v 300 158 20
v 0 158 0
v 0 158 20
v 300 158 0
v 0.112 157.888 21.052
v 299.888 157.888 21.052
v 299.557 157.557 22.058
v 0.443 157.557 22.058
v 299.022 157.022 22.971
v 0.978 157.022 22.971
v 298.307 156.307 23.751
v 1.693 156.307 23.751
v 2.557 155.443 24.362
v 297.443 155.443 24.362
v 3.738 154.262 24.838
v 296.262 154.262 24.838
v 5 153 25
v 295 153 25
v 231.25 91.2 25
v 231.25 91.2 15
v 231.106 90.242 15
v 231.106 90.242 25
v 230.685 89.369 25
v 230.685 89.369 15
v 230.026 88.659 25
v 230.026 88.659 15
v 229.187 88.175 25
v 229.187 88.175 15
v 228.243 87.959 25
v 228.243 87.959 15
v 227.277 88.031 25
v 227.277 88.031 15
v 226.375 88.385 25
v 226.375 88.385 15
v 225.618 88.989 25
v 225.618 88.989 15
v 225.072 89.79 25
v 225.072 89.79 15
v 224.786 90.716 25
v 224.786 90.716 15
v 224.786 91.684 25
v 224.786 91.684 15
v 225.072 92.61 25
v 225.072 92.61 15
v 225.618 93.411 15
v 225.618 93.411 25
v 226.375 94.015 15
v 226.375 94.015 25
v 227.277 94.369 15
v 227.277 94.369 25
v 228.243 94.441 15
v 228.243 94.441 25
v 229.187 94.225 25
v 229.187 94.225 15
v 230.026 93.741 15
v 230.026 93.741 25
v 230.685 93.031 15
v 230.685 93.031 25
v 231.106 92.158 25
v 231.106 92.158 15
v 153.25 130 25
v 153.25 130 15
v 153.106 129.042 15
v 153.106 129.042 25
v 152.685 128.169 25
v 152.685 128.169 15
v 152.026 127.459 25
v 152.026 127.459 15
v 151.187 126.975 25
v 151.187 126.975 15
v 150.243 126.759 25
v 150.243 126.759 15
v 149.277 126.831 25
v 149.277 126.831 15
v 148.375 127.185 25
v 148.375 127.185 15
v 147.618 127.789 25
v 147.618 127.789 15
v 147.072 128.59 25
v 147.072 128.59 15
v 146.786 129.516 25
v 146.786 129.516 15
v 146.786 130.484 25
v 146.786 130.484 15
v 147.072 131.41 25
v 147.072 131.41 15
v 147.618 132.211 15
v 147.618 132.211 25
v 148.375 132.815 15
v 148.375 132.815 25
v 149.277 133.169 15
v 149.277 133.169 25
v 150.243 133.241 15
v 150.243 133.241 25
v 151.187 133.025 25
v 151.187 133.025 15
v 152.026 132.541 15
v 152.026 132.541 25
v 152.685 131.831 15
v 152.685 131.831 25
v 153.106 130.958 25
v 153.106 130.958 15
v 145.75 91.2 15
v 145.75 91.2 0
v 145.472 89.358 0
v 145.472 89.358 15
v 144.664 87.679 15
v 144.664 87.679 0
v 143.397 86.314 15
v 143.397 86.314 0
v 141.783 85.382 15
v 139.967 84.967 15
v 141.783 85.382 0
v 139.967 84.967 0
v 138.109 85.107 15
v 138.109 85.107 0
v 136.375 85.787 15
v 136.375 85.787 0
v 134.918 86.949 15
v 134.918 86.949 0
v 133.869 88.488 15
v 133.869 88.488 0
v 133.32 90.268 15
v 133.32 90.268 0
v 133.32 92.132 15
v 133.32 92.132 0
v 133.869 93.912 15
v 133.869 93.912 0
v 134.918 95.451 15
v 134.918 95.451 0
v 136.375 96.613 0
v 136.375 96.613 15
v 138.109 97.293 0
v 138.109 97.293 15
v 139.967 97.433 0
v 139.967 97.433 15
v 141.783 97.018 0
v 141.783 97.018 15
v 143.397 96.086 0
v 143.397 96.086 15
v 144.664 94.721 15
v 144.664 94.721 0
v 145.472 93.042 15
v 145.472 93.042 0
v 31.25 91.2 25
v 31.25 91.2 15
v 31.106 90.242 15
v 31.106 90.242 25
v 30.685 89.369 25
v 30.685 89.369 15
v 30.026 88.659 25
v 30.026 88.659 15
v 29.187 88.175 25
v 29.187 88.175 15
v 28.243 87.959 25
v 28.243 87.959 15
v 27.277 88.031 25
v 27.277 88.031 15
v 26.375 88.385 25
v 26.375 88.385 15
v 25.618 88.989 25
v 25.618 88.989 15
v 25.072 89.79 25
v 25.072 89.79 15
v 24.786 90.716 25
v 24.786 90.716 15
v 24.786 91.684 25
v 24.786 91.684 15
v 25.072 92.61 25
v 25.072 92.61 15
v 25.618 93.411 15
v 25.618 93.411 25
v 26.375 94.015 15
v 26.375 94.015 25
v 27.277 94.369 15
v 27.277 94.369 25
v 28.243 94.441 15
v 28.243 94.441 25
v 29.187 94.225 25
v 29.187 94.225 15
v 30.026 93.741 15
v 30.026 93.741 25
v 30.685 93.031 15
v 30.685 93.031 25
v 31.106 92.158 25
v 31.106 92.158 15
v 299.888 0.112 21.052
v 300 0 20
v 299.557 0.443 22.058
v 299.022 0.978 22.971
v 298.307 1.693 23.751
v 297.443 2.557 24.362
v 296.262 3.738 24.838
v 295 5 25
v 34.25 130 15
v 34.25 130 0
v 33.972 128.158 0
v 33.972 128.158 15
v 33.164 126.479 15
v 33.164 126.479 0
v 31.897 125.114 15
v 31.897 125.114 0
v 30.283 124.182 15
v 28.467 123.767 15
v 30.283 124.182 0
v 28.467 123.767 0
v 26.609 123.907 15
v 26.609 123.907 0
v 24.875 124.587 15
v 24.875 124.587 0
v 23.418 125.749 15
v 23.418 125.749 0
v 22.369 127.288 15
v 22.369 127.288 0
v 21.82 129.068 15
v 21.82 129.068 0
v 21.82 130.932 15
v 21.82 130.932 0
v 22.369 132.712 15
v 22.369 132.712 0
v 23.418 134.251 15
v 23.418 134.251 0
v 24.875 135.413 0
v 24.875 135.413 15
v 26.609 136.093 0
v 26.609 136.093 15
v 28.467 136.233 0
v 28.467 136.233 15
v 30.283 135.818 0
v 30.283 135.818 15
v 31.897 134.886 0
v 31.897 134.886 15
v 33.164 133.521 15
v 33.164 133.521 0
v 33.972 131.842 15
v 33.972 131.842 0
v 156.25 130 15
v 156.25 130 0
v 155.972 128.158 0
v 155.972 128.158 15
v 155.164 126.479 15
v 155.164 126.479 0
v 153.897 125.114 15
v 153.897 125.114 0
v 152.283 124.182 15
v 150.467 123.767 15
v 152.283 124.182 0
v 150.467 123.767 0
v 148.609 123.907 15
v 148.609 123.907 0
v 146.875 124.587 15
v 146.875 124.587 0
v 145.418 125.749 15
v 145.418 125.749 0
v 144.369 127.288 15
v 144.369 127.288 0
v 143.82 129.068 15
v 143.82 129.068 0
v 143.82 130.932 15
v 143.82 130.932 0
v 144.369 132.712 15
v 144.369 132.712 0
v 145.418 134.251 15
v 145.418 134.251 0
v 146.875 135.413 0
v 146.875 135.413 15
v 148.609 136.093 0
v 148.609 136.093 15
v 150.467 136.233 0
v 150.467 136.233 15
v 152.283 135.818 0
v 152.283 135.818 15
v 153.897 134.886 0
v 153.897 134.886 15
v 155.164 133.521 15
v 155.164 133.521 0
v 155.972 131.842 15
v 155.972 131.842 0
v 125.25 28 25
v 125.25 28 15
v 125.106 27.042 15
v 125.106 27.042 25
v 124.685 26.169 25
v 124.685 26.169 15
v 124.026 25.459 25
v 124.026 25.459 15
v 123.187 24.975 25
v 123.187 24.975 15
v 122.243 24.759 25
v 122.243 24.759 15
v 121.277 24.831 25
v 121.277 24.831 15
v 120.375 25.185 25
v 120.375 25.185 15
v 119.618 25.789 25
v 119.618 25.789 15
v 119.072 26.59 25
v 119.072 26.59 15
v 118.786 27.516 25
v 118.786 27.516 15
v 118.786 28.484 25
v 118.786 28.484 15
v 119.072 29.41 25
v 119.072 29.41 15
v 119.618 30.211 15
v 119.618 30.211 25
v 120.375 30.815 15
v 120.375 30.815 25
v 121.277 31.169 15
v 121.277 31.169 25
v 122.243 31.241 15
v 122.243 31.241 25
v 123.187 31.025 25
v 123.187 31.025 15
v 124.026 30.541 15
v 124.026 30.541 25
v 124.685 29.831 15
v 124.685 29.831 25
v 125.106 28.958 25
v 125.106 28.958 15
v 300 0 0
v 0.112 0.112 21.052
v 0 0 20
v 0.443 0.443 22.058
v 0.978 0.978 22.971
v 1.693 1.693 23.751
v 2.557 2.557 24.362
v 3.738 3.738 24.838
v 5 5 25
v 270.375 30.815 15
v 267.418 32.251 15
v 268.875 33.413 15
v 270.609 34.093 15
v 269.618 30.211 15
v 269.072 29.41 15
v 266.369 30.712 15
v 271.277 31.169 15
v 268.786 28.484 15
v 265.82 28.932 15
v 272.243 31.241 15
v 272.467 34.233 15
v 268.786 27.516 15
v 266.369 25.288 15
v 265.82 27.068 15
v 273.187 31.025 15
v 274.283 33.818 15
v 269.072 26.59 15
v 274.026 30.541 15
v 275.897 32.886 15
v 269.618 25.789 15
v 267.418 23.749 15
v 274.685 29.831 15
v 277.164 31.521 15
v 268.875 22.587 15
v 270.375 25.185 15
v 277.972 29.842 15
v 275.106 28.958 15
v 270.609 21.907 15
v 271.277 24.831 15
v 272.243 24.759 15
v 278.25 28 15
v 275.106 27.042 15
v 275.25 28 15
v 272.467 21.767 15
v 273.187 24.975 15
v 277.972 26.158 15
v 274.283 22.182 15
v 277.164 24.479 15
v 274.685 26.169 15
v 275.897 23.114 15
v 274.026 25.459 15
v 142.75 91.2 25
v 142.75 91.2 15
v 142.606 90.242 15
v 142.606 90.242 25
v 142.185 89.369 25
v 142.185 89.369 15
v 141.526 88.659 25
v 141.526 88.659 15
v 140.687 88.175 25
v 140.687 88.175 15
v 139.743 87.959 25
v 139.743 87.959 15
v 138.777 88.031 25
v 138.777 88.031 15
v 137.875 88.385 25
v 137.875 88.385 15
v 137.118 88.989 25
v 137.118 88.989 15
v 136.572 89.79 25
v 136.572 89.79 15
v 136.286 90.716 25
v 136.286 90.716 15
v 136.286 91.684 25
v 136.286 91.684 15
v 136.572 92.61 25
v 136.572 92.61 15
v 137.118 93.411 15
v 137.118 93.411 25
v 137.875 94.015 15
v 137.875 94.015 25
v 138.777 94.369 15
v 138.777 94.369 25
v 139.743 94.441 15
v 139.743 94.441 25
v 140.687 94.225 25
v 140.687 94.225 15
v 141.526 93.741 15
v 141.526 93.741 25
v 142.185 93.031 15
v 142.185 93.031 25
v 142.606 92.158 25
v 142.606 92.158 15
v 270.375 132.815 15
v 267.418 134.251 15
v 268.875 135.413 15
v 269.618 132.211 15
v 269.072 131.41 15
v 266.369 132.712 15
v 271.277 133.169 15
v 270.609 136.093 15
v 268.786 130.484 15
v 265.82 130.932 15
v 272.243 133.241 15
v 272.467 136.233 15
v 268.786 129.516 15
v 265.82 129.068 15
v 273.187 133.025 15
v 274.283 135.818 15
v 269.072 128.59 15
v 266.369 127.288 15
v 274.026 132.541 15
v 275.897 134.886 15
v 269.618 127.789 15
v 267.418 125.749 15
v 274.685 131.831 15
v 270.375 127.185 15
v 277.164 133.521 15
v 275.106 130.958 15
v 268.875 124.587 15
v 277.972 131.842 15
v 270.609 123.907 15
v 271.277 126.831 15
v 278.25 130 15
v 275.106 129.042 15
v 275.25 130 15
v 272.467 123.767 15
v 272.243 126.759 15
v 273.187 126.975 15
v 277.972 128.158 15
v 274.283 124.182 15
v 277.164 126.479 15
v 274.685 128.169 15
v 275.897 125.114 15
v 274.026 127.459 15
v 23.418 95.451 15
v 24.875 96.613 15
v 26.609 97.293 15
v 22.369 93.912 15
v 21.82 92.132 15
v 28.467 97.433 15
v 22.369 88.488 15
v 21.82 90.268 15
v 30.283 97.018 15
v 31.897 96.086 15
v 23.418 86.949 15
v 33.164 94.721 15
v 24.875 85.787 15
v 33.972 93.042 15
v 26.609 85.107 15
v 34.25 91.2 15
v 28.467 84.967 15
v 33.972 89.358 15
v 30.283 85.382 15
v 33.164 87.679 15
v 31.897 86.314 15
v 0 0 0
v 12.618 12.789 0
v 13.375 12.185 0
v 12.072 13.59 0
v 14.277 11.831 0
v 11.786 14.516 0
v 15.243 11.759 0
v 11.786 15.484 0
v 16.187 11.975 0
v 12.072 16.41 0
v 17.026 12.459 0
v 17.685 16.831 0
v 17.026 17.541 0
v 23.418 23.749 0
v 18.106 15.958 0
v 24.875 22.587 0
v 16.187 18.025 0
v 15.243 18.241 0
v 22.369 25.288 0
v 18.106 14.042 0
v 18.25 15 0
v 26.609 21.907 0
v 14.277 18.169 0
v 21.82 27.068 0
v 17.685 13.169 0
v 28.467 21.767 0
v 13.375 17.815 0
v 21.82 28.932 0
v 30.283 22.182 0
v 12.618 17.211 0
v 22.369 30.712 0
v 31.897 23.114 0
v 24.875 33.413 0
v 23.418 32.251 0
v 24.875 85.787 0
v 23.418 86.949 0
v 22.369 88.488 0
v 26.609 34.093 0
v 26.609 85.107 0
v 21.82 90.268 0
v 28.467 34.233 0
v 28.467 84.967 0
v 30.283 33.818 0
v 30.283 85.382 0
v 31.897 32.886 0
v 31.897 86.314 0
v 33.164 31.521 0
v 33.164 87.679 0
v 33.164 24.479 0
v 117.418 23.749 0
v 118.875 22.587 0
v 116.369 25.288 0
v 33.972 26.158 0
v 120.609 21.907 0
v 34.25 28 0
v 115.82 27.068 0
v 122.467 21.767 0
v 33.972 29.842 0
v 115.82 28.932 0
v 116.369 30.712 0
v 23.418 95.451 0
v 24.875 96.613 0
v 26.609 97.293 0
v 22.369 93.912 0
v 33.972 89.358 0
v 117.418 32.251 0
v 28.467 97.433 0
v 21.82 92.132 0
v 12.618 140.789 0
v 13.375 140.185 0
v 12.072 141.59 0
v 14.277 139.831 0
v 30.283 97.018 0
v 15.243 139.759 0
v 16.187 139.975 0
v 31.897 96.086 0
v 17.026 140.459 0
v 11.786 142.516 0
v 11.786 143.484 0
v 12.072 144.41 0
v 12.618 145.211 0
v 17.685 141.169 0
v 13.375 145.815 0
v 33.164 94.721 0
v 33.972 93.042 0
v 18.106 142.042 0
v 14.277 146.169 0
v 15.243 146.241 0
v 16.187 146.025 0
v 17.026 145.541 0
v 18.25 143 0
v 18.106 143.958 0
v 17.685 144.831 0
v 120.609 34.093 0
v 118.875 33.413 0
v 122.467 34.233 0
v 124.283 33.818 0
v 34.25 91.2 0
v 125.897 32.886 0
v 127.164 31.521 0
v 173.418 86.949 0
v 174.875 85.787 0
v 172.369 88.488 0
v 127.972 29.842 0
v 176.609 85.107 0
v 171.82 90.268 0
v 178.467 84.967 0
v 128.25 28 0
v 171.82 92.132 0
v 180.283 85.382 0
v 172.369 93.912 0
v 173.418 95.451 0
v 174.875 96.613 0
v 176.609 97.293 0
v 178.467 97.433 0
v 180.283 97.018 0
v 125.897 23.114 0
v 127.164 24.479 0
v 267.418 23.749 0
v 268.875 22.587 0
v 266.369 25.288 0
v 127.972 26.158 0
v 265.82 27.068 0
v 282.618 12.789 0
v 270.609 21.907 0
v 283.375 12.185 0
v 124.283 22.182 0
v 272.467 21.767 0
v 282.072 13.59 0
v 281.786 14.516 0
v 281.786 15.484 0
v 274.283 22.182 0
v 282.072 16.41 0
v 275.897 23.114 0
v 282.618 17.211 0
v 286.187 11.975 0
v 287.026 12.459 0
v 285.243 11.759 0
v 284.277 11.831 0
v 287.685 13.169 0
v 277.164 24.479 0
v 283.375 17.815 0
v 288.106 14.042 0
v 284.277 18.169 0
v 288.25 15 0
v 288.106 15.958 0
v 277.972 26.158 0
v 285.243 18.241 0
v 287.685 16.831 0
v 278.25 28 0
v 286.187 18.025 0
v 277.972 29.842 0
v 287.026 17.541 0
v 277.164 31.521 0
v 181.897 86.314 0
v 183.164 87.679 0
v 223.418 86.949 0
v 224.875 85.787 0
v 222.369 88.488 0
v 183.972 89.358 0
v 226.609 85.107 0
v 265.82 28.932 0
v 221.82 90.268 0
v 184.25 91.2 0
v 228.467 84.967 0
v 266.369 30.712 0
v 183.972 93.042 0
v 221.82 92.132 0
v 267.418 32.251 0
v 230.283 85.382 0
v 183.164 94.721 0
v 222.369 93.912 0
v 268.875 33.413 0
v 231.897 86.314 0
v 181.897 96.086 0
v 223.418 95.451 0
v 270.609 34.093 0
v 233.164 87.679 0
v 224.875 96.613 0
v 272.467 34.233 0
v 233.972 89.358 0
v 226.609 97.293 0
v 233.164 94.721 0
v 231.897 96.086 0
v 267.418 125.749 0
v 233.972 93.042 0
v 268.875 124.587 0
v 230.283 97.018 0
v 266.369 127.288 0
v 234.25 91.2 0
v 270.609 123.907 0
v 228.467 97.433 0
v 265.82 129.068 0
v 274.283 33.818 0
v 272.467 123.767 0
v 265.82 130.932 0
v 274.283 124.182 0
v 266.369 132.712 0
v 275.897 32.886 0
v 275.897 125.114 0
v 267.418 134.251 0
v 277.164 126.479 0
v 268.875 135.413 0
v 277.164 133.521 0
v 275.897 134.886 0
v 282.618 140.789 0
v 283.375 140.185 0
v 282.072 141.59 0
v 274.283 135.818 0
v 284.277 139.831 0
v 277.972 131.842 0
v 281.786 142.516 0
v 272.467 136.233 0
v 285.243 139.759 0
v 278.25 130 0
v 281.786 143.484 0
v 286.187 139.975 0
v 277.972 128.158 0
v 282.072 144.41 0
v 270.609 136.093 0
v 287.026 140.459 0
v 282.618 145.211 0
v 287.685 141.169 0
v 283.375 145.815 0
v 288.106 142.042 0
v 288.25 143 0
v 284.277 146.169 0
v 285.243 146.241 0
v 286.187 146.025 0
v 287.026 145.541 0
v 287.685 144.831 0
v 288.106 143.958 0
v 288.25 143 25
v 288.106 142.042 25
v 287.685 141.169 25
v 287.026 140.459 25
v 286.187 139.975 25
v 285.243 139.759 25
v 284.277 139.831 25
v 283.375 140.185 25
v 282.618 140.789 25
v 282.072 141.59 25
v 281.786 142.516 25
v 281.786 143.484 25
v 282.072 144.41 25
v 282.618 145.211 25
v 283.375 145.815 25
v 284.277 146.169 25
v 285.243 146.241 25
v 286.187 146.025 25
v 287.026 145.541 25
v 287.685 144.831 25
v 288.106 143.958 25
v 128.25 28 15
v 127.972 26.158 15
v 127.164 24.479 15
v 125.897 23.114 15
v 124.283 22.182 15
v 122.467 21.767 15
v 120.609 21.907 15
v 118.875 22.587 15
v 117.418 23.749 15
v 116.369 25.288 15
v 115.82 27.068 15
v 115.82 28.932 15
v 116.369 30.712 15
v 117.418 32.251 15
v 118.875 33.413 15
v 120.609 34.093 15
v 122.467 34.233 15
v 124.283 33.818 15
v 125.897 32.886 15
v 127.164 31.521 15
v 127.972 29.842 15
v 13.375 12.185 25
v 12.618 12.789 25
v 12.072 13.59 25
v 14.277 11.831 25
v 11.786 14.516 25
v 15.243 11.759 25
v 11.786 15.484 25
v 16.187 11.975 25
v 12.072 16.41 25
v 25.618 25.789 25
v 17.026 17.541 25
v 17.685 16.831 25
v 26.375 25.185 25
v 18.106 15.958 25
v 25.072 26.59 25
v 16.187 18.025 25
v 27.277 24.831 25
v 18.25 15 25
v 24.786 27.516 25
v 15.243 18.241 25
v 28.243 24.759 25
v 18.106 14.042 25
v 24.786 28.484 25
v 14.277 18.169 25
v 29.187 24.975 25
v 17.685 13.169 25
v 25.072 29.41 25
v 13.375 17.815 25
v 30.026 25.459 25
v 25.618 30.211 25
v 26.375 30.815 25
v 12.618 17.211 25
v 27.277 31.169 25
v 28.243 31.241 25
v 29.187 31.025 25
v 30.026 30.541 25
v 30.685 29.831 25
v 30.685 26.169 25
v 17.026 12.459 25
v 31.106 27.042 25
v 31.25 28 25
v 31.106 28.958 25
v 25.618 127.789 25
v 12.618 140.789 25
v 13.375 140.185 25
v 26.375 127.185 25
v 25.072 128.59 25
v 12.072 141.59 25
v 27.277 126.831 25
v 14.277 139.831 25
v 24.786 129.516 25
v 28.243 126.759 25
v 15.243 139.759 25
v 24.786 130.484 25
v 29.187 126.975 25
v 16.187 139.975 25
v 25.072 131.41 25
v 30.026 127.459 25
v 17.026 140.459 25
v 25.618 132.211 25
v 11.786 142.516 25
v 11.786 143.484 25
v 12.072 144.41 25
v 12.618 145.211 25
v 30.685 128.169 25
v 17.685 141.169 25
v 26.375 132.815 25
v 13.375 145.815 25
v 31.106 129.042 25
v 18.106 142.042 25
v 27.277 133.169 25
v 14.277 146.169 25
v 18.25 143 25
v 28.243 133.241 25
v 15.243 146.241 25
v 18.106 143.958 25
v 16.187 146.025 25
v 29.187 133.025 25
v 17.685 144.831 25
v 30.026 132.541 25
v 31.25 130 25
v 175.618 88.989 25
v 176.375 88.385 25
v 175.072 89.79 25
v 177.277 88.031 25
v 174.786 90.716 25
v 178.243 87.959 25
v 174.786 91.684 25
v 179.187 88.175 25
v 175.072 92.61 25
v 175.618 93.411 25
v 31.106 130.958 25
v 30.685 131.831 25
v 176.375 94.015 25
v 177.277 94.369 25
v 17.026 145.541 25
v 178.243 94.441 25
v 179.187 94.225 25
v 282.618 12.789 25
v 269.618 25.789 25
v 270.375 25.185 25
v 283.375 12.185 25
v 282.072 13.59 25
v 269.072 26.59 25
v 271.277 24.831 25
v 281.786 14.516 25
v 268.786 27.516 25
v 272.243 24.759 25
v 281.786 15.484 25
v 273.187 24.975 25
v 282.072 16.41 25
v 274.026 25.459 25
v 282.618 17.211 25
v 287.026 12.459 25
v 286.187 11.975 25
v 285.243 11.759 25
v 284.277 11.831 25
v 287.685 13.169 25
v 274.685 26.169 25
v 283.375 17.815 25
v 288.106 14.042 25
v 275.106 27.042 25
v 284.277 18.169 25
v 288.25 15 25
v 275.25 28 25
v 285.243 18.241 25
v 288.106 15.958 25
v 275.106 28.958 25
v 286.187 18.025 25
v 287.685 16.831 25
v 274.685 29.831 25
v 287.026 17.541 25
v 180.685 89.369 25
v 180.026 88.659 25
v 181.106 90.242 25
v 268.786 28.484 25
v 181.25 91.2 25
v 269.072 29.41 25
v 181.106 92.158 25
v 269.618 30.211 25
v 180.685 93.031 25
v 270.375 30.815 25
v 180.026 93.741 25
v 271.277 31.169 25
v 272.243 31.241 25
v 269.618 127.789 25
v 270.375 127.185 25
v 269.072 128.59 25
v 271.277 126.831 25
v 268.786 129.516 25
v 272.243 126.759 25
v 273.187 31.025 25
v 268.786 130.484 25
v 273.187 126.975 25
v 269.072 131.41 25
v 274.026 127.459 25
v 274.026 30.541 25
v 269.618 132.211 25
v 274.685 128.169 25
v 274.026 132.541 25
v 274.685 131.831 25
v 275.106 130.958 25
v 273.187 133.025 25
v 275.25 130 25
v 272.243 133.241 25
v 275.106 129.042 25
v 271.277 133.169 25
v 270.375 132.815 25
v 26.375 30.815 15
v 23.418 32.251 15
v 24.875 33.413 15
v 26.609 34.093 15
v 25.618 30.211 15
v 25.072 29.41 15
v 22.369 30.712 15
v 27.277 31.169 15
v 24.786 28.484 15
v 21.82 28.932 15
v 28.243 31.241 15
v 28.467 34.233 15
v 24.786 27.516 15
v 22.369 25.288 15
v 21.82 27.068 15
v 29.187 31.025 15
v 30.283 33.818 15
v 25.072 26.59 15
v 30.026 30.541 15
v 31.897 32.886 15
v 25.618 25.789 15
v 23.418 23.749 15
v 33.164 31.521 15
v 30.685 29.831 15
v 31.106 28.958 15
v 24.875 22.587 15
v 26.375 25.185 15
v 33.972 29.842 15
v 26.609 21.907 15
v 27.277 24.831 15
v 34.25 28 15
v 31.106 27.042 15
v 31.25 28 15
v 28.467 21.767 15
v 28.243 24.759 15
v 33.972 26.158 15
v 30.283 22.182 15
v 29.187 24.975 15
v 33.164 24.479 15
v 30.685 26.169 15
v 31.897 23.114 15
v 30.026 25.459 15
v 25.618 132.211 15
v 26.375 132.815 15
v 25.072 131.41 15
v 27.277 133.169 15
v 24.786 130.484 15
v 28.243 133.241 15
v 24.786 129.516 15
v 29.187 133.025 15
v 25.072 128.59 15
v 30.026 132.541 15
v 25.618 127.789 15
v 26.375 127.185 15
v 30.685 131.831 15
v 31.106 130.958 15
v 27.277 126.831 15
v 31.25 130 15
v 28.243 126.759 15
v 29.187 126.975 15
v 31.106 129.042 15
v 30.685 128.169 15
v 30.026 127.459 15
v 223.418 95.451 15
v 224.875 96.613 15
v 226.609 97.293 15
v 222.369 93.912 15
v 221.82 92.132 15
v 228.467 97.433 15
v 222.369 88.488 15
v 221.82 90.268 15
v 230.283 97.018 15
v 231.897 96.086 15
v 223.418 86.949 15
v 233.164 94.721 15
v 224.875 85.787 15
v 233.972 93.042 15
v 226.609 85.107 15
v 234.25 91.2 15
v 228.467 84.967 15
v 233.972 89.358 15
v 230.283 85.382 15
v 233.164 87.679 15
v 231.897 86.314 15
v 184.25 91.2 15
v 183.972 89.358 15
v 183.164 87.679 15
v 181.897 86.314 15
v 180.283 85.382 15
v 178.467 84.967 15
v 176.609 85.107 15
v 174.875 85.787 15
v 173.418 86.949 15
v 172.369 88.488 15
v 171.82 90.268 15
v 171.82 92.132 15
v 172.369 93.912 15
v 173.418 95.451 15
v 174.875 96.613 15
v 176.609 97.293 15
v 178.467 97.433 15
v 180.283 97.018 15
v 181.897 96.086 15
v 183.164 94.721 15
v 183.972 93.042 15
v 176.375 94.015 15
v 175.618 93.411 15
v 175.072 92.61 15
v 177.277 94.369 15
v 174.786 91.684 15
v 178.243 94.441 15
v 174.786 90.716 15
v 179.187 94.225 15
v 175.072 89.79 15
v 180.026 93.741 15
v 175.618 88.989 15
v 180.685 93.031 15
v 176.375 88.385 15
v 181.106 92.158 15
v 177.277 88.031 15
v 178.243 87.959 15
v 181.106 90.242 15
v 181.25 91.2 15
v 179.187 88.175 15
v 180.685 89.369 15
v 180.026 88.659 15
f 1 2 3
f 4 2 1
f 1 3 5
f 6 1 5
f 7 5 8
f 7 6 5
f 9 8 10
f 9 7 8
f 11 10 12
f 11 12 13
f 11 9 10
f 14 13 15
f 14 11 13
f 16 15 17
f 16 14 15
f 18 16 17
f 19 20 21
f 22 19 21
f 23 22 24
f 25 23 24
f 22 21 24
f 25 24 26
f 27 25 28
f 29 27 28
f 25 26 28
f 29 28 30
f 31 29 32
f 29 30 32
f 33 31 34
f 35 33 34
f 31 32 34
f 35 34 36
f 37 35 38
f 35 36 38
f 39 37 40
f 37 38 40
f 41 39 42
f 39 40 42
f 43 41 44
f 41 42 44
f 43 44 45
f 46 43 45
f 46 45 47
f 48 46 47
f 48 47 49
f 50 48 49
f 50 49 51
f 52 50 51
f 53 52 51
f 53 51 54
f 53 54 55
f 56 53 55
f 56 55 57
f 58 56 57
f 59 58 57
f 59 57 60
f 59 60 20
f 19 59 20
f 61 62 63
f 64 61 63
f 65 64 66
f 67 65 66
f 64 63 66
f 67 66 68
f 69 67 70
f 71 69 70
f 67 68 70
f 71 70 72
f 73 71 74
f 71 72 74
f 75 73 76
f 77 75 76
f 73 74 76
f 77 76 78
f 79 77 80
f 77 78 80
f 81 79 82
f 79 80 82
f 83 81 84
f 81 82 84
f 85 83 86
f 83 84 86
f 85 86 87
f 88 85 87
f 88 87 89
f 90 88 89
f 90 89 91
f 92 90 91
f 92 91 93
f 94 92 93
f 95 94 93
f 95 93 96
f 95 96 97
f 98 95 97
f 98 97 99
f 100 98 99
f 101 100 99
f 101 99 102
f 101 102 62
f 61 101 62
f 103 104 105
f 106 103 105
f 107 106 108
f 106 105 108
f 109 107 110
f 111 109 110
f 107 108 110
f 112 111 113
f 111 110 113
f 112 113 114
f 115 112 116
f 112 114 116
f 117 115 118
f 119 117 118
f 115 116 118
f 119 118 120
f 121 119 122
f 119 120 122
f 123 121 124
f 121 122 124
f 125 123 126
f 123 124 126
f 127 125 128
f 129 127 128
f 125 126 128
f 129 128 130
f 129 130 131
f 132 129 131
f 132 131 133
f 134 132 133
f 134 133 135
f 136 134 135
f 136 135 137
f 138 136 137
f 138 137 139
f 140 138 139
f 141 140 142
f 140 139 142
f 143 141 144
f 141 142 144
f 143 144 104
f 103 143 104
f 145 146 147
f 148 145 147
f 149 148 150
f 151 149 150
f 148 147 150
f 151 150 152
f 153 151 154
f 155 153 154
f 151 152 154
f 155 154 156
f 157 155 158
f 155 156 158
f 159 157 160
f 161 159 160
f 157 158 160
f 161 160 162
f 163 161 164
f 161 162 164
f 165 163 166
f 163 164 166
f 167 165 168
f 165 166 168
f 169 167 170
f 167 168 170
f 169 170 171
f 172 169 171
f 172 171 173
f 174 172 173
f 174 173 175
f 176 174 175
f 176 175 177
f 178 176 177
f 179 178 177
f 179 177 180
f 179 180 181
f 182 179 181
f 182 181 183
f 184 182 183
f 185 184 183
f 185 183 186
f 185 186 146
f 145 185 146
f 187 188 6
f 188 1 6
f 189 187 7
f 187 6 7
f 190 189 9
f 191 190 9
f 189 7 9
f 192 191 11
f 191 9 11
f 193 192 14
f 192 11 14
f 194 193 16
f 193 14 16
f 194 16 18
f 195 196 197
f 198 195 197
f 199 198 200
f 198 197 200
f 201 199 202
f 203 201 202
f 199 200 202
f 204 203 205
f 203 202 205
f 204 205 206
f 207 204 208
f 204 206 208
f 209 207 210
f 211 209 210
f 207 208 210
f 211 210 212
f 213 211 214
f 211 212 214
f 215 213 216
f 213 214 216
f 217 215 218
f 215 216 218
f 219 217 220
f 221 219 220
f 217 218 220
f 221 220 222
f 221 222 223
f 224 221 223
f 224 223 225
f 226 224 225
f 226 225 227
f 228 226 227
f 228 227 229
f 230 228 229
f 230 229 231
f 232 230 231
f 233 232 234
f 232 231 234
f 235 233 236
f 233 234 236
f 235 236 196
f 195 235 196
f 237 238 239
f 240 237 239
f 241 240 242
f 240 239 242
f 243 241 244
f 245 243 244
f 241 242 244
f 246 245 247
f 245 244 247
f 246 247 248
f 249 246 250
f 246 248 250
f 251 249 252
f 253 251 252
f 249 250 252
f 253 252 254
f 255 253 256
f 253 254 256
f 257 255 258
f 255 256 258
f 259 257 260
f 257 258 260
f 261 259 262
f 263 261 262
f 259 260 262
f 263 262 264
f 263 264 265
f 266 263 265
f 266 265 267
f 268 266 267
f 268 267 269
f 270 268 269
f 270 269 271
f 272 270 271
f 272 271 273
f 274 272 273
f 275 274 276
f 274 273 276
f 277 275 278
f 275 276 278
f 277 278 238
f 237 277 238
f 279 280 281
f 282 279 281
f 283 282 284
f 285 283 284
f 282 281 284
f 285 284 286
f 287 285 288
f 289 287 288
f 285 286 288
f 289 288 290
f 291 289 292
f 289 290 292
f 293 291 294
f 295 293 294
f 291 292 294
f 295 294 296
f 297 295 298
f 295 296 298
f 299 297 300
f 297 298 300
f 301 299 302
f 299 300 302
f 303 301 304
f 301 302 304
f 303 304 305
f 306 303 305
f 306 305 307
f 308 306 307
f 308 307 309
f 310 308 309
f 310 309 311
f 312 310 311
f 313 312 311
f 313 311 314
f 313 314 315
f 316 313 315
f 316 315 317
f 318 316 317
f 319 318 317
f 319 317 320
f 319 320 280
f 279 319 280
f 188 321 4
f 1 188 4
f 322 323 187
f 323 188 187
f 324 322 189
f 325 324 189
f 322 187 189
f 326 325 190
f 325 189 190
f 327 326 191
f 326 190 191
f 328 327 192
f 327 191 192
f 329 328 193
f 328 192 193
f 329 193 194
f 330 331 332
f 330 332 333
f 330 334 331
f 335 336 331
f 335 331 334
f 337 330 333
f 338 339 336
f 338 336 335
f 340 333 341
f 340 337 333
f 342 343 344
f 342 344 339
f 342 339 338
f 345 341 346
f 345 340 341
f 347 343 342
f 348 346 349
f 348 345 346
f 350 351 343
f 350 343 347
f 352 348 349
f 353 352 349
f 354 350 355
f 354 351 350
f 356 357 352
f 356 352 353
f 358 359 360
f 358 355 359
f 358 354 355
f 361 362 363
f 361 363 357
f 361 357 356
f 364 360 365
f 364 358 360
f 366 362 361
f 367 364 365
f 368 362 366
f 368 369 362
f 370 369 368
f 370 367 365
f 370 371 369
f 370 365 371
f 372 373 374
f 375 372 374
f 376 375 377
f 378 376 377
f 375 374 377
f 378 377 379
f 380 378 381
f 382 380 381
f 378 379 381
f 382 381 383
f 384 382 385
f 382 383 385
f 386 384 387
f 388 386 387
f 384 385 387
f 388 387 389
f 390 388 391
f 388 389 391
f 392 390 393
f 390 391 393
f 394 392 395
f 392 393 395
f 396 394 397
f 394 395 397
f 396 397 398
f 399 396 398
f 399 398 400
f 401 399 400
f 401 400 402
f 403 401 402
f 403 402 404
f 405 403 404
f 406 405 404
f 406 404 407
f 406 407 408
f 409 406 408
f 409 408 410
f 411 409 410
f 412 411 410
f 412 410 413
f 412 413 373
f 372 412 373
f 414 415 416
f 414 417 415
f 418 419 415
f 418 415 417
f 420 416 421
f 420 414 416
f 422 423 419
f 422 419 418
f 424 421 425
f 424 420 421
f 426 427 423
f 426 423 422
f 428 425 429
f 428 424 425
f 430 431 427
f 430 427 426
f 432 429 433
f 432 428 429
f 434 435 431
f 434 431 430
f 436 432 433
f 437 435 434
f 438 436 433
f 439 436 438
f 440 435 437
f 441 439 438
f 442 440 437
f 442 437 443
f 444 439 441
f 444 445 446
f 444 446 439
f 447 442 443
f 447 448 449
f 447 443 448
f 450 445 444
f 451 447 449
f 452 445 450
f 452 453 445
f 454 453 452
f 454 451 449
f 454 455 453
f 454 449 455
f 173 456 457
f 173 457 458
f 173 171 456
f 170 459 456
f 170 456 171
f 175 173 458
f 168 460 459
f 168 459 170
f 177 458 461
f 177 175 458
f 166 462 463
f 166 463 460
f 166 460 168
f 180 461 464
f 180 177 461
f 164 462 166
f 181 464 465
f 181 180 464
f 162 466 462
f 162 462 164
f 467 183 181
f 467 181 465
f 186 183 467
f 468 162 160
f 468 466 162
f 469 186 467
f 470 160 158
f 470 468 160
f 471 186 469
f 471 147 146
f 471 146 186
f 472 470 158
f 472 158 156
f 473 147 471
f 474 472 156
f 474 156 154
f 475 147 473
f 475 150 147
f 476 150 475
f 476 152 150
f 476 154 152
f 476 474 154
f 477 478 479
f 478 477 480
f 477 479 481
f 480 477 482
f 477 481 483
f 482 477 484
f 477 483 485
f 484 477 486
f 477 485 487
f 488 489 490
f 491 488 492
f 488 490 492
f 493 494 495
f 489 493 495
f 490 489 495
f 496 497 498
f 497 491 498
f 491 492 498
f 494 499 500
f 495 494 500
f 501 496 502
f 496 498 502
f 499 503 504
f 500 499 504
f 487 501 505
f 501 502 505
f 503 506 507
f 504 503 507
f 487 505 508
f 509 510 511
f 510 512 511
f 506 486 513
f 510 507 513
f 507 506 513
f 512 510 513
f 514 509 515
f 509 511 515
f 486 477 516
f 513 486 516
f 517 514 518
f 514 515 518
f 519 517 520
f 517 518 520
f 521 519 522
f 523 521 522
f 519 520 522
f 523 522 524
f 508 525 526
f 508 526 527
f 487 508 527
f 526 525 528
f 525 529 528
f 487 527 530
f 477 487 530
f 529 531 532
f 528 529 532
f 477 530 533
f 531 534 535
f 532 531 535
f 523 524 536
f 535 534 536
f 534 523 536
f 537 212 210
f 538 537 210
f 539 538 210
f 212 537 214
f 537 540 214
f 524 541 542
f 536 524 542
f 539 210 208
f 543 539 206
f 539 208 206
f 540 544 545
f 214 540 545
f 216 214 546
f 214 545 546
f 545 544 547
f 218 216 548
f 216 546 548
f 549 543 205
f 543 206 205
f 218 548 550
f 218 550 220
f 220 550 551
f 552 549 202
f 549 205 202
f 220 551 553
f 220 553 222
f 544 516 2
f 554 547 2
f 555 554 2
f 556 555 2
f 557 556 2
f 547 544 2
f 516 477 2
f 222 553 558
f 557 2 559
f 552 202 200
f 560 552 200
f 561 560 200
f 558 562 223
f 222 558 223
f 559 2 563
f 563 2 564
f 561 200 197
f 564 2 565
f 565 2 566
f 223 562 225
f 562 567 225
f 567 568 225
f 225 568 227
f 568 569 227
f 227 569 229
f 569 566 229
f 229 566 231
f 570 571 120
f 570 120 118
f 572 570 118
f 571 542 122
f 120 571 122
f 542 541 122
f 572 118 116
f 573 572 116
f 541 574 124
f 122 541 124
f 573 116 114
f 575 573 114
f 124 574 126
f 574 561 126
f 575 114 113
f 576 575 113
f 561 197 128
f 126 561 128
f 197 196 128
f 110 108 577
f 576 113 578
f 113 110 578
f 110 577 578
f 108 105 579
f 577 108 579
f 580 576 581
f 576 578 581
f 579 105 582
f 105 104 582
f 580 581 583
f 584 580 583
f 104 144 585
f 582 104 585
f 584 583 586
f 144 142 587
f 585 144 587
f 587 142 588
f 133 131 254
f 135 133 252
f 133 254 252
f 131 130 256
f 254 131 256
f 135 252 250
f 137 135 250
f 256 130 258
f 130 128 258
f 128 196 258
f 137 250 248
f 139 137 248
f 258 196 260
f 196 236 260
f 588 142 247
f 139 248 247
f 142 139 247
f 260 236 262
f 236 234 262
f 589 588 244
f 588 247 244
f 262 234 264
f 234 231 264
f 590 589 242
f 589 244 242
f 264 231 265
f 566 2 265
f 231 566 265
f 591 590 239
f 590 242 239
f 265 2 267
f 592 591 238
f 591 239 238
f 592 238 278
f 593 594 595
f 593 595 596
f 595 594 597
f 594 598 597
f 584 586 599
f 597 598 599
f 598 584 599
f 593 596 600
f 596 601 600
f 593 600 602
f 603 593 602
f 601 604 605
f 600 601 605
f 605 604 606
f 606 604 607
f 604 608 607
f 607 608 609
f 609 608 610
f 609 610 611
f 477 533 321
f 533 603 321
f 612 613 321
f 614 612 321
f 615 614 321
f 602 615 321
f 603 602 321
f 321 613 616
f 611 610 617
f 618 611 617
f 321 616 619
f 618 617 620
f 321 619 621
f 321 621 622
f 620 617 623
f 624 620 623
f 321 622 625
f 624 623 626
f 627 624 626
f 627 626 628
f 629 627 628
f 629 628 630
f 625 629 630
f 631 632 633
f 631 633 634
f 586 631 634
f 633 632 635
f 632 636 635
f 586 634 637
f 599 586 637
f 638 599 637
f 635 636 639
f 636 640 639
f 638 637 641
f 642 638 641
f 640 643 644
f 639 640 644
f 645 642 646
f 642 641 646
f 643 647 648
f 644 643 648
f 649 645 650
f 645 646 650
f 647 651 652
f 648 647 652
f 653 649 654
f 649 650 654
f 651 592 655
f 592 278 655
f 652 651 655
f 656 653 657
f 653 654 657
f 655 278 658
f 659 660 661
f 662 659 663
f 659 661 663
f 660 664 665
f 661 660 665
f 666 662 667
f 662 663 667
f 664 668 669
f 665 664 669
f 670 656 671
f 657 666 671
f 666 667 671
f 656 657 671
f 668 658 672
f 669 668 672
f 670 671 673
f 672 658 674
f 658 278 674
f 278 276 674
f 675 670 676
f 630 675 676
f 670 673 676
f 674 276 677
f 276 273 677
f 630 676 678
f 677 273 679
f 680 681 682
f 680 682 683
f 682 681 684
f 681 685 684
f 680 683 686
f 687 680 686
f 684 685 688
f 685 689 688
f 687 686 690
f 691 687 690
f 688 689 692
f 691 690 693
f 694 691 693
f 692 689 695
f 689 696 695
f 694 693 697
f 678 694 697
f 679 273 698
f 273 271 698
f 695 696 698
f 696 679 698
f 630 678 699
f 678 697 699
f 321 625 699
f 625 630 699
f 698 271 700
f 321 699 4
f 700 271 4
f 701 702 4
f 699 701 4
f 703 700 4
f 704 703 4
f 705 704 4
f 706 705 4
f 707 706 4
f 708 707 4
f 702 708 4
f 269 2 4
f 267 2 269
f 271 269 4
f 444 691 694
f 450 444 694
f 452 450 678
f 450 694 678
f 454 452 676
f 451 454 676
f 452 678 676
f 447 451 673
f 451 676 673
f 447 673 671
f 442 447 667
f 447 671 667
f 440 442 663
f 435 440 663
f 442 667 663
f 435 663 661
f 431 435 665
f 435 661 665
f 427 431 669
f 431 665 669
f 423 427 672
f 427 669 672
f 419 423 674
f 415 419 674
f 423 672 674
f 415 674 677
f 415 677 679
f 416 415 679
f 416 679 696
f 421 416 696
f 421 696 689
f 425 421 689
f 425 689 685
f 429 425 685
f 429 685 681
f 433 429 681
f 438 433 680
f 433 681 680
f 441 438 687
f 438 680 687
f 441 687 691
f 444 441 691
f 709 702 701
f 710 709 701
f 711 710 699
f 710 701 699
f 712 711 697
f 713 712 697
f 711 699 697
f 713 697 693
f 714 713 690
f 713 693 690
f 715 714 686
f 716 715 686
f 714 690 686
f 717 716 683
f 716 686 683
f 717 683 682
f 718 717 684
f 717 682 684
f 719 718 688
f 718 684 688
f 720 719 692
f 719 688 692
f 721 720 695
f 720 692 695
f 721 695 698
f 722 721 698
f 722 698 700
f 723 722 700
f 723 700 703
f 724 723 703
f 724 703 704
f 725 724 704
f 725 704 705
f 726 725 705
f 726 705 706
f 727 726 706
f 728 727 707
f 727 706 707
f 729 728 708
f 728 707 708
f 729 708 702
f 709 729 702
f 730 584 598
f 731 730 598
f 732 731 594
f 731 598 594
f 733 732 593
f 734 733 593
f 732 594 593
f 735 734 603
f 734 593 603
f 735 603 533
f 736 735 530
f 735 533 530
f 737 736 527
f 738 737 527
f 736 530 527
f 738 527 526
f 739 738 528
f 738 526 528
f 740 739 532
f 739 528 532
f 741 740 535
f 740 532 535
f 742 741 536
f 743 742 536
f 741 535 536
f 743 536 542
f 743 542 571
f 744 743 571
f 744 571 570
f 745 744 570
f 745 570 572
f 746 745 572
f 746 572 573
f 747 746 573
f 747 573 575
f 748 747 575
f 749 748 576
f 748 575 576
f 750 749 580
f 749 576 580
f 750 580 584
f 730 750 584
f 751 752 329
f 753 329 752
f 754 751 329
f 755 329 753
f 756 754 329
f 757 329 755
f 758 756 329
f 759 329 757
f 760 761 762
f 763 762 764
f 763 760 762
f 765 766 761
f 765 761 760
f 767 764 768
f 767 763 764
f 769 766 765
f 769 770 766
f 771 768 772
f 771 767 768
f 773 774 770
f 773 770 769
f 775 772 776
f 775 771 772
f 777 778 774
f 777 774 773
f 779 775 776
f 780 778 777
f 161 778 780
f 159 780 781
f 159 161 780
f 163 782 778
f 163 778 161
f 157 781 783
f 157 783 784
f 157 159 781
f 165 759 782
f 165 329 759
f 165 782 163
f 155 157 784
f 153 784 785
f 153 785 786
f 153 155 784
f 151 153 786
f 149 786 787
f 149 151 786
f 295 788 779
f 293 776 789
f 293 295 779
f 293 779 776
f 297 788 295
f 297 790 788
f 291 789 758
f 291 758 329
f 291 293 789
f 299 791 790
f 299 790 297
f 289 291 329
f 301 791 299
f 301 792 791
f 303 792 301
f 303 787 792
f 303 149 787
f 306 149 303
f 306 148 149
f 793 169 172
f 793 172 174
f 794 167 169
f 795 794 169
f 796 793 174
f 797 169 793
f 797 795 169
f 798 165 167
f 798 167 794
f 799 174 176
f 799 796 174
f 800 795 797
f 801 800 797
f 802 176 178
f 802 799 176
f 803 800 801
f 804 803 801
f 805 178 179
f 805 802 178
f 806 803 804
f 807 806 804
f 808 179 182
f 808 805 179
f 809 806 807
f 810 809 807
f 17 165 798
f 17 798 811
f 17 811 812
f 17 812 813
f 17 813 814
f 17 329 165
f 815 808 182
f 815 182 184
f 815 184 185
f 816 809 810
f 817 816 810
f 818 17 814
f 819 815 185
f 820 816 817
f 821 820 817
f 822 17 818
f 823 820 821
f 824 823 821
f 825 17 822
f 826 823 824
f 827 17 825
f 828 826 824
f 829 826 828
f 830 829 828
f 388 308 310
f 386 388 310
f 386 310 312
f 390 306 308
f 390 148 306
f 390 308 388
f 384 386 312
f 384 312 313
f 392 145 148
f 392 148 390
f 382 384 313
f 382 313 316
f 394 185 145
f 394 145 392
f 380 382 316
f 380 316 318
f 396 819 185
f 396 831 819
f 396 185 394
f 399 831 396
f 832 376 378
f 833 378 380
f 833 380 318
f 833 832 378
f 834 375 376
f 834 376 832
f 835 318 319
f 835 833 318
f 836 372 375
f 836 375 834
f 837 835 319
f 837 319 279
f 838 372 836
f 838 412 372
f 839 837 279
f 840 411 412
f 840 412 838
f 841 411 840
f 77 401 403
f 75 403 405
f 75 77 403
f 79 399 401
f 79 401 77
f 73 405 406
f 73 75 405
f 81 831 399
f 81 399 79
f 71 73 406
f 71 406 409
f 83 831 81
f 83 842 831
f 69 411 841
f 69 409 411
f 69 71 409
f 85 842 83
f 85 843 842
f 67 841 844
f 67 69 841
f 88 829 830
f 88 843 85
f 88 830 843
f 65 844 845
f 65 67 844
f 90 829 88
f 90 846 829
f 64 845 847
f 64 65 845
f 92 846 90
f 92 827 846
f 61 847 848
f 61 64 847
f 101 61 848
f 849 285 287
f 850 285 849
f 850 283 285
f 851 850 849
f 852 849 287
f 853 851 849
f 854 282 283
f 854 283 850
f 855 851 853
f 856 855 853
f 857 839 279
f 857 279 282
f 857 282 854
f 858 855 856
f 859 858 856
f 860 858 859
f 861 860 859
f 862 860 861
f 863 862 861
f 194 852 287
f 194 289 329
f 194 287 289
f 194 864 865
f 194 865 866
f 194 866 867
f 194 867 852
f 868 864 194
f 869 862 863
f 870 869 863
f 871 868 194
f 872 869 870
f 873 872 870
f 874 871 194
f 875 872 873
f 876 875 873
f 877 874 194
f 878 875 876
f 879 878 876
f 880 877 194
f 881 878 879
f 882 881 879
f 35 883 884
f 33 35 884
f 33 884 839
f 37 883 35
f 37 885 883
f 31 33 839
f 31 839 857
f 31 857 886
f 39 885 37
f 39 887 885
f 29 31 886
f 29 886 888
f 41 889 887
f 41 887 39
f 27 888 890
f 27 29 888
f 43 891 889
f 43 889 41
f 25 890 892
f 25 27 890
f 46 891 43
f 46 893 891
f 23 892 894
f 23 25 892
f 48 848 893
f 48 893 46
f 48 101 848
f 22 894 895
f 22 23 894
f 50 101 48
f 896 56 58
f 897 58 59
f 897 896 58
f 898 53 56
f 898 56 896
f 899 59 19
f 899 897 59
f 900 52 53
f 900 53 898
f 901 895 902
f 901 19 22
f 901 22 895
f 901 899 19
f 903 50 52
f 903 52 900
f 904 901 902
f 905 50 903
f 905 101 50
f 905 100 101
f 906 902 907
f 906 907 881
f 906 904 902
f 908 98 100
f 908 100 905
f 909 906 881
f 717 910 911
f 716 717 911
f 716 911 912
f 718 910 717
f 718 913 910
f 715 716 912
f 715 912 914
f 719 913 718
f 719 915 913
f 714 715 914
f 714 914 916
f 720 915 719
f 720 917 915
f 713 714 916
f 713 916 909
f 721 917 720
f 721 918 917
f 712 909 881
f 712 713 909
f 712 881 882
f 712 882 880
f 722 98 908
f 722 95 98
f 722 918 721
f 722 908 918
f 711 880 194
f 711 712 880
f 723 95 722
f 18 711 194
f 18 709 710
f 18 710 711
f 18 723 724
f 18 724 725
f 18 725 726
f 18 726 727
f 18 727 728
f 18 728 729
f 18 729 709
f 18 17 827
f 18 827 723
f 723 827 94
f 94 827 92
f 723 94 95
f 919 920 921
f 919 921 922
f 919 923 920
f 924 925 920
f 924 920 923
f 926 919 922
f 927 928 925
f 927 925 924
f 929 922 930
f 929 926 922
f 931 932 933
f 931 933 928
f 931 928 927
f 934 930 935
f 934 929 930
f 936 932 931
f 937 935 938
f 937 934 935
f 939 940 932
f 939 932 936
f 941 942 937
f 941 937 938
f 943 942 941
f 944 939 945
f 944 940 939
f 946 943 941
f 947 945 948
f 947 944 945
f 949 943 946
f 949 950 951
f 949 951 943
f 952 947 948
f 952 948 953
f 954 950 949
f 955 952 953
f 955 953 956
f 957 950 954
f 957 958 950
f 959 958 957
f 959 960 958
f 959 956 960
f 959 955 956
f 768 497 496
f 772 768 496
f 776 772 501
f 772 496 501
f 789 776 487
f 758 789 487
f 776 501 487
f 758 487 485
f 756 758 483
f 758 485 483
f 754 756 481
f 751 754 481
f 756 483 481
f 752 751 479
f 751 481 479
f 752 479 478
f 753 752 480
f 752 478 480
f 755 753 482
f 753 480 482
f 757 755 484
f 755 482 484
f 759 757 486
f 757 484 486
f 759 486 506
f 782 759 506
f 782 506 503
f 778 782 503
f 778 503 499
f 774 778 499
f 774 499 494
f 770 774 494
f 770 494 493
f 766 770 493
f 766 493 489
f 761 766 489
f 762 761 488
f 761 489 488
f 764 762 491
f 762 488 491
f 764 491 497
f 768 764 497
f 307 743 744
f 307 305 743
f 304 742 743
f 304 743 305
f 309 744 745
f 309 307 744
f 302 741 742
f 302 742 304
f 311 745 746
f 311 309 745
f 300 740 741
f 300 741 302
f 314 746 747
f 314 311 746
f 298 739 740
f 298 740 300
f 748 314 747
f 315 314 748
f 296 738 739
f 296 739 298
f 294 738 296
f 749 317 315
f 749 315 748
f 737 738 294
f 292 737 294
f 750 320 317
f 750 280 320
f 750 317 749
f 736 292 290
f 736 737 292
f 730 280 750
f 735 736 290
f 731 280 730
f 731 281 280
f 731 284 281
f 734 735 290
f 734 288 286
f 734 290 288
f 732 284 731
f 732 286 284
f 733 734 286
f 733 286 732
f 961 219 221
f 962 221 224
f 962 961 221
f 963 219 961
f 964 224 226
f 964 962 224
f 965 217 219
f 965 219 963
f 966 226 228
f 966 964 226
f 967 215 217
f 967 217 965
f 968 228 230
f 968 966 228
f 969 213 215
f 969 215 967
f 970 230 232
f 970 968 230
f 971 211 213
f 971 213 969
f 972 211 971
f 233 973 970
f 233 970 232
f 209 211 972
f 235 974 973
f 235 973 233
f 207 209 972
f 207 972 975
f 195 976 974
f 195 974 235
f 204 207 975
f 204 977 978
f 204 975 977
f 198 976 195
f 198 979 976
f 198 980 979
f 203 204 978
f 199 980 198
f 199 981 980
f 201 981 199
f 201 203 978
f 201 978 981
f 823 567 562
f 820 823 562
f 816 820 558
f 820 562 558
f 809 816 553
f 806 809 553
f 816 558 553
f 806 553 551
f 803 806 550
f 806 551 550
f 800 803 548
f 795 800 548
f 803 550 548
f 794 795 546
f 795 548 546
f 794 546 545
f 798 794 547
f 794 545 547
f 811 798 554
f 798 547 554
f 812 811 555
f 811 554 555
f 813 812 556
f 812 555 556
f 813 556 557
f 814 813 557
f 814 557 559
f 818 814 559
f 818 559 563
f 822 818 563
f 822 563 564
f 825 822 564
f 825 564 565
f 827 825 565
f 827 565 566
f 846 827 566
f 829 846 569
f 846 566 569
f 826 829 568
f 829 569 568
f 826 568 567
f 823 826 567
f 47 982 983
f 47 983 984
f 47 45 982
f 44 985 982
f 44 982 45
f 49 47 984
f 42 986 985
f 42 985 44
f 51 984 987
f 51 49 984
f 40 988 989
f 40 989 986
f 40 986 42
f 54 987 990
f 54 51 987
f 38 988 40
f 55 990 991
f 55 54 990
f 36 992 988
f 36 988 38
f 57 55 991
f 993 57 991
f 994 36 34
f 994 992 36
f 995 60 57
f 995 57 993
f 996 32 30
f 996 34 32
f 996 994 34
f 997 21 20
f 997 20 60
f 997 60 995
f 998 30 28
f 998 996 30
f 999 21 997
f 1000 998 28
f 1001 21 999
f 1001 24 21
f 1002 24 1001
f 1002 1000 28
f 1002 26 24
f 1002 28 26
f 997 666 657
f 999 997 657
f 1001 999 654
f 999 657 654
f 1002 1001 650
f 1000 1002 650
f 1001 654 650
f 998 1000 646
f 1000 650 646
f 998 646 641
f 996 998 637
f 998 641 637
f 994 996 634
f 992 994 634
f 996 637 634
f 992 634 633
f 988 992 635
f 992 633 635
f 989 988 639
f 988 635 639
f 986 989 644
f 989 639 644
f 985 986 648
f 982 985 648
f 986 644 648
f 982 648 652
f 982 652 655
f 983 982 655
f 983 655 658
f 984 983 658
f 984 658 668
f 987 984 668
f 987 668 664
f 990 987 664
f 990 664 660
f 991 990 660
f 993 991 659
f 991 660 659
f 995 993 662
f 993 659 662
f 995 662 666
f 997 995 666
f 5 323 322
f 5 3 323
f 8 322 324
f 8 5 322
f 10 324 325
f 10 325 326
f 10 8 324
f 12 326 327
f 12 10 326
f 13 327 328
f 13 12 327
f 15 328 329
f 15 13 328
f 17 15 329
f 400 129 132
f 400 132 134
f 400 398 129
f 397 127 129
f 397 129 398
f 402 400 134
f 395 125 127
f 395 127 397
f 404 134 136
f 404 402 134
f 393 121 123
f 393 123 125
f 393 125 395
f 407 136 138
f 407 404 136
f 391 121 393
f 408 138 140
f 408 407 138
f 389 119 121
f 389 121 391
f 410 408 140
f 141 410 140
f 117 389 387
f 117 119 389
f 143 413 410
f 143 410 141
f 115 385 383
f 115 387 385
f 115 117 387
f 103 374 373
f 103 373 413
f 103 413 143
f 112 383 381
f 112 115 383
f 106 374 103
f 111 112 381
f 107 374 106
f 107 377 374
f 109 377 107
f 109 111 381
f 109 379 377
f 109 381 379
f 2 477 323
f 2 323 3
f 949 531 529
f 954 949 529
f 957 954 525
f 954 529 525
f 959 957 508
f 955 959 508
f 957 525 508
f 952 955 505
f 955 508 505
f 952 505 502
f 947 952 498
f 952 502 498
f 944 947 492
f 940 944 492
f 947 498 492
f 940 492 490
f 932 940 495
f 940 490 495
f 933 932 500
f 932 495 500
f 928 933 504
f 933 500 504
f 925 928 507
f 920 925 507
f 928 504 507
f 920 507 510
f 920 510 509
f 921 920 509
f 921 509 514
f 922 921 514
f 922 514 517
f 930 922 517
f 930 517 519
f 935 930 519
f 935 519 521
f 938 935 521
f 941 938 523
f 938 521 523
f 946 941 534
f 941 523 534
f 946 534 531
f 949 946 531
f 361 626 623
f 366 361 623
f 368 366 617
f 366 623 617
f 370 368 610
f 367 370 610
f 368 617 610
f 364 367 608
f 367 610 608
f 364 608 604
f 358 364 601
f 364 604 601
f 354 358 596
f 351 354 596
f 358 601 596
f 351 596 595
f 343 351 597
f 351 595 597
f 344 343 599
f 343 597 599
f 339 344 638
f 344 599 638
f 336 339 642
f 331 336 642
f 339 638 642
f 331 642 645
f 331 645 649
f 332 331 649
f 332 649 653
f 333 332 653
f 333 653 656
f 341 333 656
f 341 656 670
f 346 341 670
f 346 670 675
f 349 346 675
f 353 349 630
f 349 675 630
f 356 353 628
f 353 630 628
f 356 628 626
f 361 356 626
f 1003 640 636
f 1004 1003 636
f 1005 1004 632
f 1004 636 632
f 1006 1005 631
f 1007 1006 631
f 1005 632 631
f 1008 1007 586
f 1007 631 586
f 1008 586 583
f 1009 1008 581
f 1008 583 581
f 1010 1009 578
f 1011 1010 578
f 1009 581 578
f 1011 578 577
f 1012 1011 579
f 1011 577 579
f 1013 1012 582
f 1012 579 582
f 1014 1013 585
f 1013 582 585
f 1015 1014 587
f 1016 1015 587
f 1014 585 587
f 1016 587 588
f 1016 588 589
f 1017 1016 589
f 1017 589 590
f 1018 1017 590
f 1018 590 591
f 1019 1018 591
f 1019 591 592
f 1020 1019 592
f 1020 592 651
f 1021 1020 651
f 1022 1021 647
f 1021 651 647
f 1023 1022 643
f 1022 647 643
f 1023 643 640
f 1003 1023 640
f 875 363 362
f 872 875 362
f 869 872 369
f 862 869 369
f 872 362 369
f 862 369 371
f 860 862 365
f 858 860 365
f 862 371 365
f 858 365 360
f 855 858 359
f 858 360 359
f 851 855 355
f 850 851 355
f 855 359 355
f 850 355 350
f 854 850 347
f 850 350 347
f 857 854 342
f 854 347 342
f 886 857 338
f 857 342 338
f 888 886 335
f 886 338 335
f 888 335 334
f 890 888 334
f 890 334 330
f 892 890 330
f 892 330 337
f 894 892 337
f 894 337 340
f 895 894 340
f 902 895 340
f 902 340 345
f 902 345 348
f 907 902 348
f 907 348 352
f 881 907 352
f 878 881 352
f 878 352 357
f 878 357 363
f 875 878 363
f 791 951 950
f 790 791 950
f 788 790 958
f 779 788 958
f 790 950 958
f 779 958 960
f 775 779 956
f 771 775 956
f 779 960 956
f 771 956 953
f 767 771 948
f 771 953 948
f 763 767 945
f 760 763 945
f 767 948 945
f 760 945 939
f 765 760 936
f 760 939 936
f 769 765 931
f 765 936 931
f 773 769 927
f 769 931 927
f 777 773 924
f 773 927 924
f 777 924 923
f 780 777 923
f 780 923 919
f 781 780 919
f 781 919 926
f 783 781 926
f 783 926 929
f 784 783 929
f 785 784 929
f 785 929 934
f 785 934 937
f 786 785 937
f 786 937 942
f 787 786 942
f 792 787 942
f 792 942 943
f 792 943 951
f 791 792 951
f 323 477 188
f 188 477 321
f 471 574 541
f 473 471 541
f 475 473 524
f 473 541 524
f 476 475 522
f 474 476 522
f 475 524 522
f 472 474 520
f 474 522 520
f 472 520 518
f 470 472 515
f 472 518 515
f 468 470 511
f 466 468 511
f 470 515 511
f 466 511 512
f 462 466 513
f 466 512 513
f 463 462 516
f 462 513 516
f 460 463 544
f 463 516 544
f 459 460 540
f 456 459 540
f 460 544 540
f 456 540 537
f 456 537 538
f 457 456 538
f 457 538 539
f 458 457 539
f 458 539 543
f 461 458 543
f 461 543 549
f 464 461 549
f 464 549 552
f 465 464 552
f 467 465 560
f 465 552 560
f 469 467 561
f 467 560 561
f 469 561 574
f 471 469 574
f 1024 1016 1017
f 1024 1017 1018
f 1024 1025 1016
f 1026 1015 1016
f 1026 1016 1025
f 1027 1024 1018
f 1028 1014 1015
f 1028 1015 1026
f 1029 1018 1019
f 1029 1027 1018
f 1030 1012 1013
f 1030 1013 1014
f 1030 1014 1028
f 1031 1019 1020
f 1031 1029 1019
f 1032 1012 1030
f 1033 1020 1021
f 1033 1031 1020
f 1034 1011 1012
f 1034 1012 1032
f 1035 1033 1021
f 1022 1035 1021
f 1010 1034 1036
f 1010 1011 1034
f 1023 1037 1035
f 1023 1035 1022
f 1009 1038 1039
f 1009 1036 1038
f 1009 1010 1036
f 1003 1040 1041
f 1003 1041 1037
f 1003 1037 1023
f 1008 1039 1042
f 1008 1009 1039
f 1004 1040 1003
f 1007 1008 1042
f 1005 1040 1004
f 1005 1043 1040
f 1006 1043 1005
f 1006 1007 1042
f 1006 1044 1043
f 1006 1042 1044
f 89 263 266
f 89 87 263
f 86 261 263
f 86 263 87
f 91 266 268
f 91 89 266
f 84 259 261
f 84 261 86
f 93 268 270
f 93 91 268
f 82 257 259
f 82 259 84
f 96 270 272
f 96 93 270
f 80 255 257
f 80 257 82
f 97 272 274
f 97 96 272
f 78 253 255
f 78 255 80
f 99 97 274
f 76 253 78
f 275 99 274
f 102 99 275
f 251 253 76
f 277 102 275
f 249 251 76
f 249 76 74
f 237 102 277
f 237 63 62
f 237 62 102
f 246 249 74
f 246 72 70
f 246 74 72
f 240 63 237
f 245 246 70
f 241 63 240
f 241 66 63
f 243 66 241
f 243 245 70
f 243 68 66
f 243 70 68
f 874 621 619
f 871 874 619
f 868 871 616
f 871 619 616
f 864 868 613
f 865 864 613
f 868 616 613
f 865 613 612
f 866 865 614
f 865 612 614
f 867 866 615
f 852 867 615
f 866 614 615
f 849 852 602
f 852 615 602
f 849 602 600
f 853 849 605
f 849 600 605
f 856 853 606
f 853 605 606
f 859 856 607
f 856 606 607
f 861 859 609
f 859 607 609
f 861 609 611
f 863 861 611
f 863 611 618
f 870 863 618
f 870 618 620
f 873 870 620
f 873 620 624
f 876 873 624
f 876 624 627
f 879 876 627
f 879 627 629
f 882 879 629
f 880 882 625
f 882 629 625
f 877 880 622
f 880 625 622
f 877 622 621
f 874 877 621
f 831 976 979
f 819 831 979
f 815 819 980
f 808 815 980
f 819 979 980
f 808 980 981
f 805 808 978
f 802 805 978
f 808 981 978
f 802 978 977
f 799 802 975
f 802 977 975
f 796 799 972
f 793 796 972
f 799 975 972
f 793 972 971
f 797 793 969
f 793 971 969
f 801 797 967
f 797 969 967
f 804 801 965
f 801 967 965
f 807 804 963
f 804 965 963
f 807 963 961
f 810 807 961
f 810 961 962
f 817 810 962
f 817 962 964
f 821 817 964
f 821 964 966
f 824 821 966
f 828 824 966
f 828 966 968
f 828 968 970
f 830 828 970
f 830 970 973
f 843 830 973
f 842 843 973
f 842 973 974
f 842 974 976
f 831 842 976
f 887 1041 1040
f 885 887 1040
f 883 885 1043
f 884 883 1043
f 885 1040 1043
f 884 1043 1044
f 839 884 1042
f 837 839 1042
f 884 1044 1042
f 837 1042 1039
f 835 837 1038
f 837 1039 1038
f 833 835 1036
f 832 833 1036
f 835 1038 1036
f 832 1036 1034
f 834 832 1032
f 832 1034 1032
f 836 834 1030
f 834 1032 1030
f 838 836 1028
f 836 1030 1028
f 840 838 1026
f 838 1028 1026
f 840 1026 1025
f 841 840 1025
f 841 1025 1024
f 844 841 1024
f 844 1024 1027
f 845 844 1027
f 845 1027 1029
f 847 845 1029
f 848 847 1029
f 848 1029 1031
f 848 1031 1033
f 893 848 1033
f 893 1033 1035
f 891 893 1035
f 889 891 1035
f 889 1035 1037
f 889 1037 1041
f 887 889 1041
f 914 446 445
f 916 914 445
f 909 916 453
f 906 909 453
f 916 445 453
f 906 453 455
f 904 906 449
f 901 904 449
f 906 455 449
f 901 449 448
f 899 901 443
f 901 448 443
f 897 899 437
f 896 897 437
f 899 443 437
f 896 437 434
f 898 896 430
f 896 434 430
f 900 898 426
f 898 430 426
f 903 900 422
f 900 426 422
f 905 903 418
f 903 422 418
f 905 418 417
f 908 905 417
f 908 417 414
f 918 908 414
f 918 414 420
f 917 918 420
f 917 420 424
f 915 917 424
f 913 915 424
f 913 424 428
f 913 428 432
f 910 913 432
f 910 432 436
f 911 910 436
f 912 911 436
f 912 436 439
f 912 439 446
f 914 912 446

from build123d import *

# Parameters (mm, degrees)
F0_W     = 300
F0_H     = 158
F1_DEPTH = 25
F2_R     = 5
F3_R     = 3.25
F4_DEPTH = 25
F5_R     = 3.25
F6_DEPTH = 25
F7_R     = 6.25
F8_DEPTH = 15


with BuildPart() as f1:
    # F0 (on Top) → F1 (new body)
    with BuildSketch(Plane.XY):
        with Locations((150, 79)):
            Rectangle(F0_W, F0_H)
    extrude(amount=F1_DEPTH)

    # F2
    f2_edges = [f1.edges().sort_by_distance(p)[0] for p in [
        (0, 79, 25),
        (150, 158, 25),
        (150, 0, 25),
        (300, 79, 25),
    ]]
    fillet(f2_edges, radius=F2_R)

    # F3 (on face) → F4 (cut)
    with BuildSketch(Plane(origin=(0, 0, 0), x_dir=(1, 0, 0), z_dir=(0, 0, -1))):
        with Locations((15, -15)):
            Circle(F3_R)
        with Locations((285, -15)):
            Circle(F3_R)
        with Locations((15, -143)):
            Circle(F3_R)
        with Locations((285, -143)):
            Circle(F3_R)
    extrude(amount=-F4_DEPTH, mode=Mode.SUBTRACT)

    # F5 (on face) → F6 (cut)
    with BuildSketch(Plane(origin=(0, 0, 0), x_dir=(1, 0, 0), z_dir=(0, 0, -1))):
        with Locations((272, -28)):
            Circle(F5_R)
        with Locations((28, -28)):
            Circle(F5_R)
        with Locations((28, -130)):
            Circle(F5_R)
        with Locations((272, -130)):
            Circle(F5_R)
        with Locations((150, -130)):
            Circle(F5_R)
        with Locations((122, -28)):
            Circle(F5_R)
        with Locations((28, -91.2)):
            Circle(F5_R)
        with Locations((139.5, -91.2)):
            Circle(F5_R)
        with Locations((178, -91.2)):
            Circle(F5_R)
        with Locations((228, -91.2)):
            Circle(F5_R)
    extrude(amount=-F6_DEPTH, mode=Mode.SUBTRACT)

    # F7 (on face) → F8 (cut)
    with BuildSketch(Plane(origin=(0, 0, 0), x_dir=(1, 0, 0), z_dir=(0, 0, -1))):
        with Locations((28, -28)):
            Circle(F7_R)
        with Locations((122, -28)):
            Circle(F7_R)
        with Locations((272, -28)):
            Circle(F7_R)
        with Locations((228, -91.2)):
            Circle(F7_R)
        with Locations((178, -91.2)):
            Circle(F7_R)
        with Locations((139.5, -91.2)):
            Circle(F7_R)
        with Locations((150, -130)):
            Circle(F7_R)
        with Locations((272, -130)):
            Circle(F7_R)
        with Locations((28, -130)):
            Circle(F7_R)
        with Locations((28, -91.2)):
            Circle(F7_R)
    extrude(amount=-F8_DEPTH, mode=Mode.SUBTRACT)


solid = f1.part
